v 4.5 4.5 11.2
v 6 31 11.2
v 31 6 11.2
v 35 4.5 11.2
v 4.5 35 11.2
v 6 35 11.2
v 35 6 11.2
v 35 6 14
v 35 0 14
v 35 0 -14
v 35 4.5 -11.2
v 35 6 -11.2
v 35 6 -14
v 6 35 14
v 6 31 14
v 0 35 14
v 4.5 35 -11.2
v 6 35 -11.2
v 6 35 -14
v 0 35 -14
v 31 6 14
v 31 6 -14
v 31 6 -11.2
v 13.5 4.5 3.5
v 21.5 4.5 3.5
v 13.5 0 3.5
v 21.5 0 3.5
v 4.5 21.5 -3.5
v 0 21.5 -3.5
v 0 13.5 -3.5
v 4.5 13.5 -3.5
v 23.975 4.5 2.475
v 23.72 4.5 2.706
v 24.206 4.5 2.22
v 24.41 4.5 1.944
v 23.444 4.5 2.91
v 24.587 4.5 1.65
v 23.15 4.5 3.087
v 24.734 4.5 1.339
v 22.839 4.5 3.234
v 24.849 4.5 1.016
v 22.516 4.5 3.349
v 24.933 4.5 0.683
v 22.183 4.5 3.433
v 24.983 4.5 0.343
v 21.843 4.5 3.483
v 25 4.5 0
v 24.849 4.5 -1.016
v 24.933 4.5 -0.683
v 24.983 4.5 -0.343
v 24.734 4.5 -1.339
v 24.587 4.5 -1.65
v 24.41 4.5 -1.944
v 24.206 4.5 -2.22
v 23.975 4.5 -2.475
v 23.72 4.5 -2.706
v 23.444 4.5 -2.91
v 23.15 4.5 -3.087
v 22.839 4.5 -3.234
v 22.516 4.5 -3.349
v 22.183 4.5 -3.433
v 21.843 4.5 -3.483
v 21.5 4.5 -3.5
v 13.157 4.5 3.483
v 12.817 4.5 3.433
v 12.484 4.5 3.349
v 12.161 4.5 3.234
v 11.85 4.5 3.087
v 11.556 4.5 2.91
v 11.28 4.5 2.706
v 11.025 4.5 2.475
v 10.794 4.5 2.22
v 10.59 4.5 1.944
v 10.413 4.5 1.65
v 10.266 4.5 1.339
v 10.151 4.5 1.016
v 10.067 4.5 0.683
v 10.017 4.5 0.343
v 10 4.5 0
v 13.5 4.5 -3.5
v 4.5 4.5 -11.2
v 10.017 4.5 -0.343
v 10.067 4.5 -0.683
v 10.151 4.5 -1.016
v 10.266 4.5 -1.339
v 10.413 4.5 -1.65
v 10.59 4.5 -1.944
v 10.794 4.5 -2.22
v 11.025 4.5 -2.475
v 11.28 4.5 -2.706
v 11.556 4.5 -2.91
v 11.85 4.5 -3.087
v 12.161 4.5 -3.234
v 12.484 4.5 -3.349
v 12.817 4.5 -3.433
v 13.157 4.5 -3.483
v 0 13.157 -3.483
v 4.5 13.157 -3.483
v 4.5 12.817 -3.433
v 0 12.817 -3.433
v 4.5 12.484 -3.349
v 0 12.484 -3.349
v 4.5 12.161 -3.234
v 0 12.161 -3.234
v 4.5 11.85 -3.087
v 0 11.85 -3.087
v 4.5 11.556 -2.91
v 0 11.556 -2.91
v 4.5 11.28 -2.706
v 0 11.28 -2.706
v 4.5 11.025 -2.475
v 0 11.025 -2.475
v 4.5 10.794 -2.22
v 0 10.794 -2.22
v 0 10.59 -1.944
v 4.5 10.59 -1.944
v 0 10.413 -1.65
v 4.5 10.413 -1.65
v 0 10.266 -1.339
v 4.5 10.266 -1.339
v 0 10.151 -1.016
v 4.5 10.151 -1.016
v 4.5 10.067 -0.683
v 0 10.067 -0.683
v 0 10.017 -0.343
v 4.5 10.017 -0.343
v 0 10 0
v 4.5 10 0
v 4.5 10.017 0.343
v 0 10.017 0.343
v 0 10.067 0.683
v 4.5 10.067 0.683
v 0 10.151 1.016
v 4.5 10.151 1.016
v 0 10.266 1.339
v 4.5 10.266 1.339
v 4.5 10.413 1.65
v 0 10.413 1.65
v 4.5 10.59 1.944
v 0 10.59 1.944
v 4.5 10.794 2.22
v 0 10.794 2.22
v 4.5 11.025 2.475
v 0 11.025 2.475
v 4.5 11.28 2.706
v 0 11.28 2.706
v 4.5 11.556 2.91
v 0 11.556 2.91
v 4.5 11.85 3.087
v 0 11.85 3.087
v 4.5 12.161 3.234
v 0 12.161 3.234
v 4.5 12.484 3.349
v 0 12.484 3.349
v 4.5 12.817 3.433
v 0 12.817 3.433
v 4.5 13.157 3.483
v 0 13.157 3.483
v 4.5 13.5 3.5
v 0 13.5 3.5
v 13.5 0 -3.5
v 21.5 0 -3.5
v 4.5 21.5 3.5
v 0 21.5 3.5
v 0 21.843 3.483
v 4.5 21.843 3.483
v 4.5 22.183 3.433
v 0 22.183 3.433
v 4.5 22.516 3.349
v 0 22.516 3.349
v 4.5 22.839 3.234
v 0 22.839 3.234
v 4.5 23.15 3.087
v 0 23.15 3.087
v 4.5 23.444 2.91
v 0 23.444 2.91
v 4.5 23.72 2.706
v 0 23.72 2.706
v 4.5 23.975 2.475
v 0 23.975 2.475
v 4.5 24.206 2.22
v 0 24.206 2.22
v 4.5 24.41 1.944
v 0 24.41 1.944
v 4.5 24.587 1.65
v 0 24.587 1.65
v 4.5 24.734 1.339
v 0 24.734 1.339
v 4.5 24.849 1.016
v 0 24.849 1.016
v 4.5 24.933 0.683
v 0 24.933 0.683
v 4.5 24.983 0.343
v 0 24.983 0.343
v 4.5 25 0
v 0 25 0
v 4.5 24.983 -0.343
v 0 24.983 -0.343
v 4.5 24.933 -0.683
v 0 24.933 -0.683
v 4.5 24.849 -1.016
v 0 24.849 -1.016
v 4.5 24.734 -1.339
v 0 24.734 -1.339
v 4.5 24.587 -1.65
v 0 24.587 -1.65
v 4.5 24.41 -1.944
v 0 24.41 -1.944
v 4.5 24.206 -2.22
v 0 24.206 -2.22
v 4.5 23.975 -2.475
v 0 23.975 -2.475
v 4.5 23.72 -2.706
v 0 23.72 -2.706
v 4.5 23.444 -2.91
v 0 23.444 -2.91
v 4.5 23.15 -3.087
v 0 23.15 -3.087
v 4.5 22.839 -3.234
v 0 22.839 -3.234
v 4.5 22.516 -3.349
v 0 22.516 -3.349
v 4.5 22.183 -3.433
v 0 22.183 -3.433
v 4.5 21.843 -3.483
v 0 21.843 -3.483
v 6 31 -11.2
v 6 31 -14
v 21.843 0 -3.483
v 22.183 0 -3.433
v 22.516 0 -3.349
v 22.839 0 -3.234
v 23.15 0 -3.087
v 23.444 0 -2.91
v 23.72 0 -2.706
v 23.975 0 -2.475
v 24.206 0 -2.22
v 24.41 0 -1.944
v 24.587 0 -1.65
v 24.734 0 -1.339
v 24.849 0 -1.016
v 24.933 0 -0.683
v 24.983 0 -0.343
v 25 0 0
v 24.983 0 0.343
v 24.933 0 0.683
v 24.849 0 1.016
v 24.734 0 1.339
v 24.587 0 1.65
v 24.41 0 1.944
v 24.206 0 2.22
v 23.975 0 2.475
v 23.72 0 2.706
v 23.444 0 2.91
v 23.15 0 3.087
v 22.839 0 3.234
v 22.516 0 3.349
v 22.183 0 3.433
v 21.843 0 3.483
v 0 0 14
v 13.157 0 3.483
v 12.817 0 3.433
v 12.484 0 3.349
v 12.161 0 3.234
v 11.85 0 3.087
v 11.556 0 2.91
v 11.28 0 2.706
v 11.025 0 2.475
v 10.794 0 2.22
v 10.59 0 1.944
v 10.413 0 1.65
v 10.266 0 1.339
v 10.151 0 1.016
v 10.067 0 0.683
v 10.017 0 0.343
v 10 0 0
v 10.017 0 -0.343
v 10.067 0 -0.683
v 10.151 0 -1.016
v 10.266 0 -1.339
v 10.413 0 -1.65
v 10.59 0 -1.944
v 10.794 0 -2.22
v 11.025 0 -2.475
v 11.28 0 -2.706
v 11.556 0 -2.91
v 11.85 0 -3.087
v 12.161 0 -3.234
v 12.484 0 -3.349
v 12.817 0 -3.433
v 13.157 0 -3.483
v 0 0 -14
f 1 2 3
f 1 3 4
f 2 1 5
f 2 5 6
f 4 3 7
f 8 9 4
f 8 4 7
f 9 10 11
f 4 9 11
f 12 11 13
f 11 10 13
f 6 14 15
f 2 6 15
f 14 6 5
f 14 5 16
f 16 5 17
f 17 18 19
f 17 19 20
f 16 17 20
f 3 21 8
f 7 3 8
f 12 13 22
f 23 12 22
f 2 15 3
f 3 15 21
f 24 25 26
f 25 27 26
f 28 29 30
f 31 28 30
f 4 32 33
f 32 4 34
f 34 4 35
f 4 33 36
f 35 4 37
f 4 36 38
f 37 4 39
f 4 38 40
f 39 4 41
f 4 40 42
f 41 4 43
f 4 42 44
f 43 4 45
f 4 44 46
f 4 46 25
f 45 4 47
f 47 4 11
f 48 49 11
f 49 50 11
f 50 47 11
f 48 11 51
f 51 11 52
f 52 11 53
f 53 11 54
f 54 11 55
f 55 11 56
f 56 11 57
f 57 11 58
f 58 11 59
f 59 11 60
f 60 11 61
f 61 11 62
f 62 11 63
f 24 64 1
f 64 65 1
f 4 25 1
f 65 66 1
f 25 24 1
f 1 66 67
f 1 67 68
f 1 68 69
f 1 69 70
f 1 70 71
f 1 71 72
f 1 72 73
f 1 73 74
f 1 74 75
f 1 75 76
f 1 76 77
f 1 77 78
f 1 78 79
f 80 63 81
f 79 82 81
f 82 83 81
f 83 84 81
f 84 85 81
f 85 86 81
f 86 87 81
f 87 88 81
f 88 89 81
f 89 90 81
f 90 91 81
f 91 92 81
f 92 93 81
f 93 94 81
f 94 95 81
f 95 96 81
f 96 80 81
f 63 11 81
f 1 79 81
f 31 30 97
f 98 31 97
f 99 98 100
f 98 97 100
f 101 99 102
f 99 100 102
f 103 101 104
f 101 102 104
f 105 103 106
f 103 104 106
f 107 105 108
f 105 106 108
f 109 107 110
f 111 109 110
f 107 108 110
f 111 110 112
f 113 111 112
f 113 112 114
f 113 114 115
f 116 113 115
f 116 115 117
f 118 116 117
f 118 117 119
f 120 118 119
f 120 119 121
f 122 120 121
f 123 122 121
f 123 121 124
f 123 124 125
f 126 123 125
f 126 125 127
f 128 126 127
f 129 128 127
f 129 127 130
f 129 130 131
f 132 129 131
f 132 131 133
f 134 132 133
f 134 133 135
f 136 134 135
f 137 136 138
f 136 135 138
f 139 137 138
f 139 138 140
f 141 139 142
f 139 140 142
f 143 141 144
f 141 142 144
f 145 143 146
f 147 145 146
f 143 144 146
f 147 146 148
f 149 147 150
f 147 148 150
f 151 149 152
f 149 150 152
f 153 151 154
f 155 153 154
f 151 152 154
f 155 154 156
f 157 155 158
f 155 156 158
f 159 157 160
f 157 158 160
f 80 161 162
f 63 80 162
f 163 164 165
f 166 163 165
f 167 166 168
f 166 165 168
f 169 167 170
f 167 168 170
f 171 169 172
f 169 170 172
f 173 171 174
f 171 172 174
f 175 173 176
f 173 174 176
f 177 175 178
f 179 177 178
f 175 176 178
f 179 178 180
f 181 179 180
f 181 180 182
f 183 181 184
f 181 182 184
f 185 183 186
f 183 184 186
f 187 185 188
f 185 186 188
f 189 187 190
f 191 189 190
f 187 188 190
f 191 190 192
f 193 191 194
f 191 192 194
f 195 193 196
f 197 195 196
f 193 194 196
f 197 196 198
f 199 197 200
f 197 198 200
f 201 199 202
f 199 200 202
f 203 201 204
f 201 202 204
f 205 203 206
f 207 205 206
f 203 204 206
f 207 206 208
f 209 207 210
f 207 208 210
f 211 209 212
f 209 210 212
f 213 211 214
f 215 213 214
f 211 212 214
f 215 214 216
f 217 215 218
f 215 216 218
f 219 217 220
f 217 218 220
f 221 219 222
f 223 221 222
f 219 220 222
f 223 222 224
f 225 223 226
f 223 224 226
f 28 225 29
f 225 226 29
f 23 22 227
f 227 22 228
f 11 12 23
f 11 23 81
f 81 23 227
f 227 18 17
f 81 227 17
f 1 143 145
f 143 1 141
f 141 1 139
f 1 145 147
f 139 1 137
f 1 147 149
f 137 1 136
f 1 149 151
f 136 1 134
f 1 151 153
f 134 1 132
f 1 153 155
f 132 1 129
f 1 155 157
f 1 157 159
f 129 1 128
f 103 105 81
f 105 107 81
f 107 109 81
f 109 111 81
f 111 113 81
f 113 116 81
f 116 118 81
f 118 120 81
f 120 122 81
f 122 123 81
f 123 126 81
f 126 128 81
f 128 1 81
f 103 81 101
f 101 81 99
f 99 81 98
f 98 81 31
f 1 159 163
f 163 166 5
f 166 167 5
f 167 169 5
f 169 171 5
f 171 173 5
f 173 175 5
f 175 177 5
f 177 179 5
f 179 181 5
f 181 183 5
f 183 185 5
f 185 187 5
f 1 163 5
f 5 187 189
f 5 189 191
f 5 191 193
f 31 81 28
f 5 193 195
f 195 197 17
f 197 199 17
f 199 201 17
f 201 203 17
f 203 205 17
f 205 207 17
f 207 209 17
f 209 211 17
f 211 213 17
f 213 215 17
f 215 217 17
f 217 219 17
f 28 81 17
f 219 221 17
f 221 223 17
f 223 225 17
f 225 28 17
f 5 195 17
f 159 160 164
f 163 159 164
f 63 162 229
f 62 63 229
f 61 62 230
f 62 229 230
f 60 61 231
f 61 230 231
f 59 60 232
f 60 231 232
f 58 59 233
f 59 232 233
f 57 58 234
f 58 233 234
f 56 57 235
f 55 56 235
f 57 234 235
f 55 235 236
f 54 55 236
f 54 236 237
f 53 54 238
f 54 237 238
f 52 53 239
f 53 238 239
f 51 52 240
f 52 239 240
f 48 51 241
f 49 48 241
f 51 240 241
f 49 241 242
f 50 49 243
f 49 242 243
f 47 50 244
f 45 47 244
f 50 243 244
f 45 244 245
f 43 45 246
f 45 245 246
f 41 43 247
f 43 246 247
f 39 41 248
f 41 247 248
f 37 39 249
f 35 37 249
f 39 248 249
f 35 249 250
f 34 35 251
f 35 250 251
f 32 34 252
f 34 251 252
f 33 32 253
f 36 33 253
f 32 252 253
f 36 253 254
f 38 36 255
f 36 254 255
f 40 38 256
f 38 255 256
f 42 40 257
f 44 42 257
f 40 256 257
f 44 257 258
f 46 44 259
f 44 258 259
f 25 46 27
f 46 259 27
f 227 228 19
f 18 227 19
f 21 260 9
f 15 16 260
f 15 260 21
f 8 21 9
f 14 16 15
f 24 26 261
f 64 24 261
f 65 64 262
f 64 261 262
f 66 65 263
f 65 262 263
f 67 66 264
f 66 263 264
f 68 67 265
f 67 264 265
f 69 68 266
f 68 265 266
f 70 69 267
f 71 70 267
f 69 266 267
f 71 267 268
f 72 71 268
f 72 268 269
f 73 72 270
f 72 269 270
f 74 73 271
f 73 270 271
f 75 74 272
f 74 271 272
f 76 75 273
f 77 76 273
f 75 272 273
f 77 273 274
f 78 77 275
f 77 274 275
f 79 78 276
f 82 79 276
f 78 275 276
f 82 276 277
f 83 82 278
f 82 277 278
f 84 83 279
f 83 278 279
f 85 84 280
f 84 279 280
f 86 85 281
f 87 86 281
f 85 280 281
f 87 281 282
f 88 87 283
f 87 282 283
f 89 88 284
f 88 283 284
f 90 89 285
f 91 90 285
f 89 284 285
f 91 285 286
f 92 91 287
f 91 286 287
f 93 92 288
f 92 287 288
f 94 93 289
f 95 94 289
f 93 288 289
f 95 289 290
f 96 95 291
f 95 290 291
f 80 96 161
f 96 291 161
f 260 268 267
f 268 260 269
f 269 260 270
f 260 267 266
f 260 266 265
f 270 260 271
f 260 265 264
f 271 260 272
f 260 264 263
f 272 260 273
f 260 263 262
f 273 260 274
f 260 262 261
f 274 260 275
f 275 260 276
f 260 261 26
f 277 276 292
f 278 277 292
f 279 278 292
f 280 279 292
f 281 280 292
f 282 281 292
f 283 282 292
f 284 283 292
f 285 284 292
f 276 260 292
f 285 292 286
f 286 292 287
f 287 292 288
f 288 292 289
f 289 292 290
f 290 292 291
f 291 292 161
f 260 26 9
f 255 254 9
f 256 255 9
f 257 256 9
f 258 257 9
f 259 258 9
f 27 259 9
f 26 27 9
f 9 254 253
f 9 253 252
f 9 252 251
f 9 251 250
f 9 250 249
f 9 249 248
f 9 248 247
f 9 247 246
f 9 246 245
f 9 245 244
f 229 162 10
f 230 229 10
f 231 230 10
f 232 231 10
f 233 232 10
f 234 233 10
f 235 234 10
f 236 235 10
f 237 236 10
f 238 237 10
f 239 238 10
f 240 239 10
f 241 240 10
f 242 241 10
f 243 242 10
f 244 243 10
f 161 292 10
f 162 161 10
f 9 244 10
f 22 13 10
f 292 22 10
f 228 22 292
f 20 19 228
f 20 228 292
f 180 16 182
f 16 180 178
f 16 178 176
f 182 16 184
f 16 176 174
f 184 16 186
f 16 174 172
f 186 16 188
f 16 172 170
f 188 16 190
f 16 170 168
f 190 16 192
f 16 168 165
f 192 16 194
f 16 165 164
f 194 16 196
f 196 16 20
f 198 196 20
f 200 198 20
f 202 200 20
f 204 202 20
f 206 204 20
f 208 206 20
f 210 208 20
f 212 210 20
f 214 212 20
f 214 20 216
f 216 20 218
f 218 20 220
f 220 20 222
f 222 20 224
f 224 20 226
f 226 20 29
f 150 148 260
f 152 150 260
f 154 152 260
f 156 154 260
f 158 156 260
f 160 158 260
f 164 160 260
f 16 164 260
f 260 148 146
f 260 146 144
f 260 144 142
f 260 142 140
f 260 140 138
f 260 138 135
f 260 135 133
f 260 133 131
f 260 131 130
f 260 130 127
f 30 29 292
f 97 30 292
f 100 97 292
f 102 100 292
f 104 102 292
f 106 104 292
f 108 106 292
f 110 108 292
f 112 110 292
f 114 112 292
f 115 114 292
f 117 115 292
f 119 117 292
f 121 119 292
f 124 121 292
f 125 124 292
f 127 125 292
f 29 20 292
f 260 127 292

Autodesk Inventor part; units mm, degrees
ref_plane "YZ Plane" through (0, 0, 0) normal (1, 0, 0) x (0, 1, 0)
ref_plane "XZ Plane" through (0, 0, 0) normal (0, 1, 0) x (-1, 0, 0)
ref_plane "XY Plane" through (0, 0, 0) normal (0, 0, 1) x (1, 0, 0)
sketch "Sketch1" plane through (0, 0, 0) normal (0, 0, 1) x (1, 0, 0)
  line L0 (0, 0) -> (35, 0)
  line L1 (35, 0) -> (35, 4.5)
  line L2 (35, 4.5) -> (4.5, 4.5)
  line L3 (4.5, 4.5) -> (4.5, 35)
  line L4 (4.5, 35) -> (0, 35)
  line L5 (0, 35) -> (0, 0)
  dimension "d0" = 35
  dimension "d1" = 35
  dimension "d2" = 4.5
  dimension "d3" = 4.5
extrude "Extrusion1" add sketch "Sketch1" along normal mid plane 28
sketch "Sketch2" plane through (0, 0, 14) normal (0, 0, 1) x (1, 0, 0)
  line L0 (0, 0) -> (35, 0) projected
  line L1 (35, 0) -> (35, 4.5) projected
  line L2 (35, 4.5) -> (4.5, 4.5) projected
  line L3 (4.5, 4.5) -> (4.5, 35) projected
  line L4 (4.5, 35) -> (0, 35) projected
  line L5 (0, 35) -> (0, 0) projected
  line L6 (4.5, 35) -> (6, 35)
  line L7 (6, 35) -> (6, 31)
  line L8 (6, 31) -> (31, 6)
  line L9 (31, 6) -> (35, 6)
  line L10 (35, 4.5) -> (4.5, 4.5) projected
  line L11 (35, 6) -> (35, 4.5)
  dimension "d6" = 45
  dimension "d7" = 1.5
  dimension "d8" = 1.5
  dimension "d9" = 4
extrude "Extrusion2" add sketch "Sketch2" against normal blind 2.8 contours L2 L3 L6 L7 L8 L9 L11
mirror "Mirror1" about plane through (0, 0, 0) normal (0, 0, 1) of "Extrusion2"
sketch "Sketch3" plane through (0, 0, 14) normal (-1, 0, 0) x (0, 0, 1)
  line L0 (0, 0) -> (-28, 0) projected
  line L1 (0, 35) -> (0, 0) projected
  line L2 (-28, 35) -> (0, 35) projected
  line L3 (-28, 0) -> (-28, 35) projected
  line L4 (-25.2, 35) -> (-2.8, 35) construction
  line L5 (-14, 35) -> (-14, 0) construction
  line L6 (-14, 21.5) -> (-14, 13.5)
  line L7 (-17.5, 21.5) -> (-17.5, 13.5)
  line L8 (-10.5, 13.5) -> (-10.5, 21.5)
  arc A0 (-10.5, 21.5) -> (-17.5, 21.5) centre (-14, 21.5) ccw
  arc A1 (-17.5, 13.5) -> (-10.5, 13.5) centre (-14, 13.5) ccw
  point P0 (-14, 17.5)
  point P1 (-14, 17.5)
  dimension "d12" = 8
  dimension "d13" = 3.5
extrude "Extrusion3" cut sketch "Sketch3" against normal through all contours A0 L8 A1 L7
sketch "Sketch4" plane through (0, 0, 14) normal (0, -1, 0) x (1, 0, 0)
  line L0 (35, -28) -> (35, 0) projected
  line L1 (0, 0) -> (35, 0) projected
  line L2 (0, 0) -> (0, -28) projected
  line L3 (35, -28) -> (0, -28) projected
  line L4 (0, -14) -> (35, -14) construction
  line L5 (13.5, -14) -> (21.5, -14) construction
  line L6 (13.5, -17.5) -> (21.5, -17.5)
  line L7 (21.5, -10.5) -> (13.5, -10.5)
  arc A0 (13.5, -10.5) -> (13.5, -17.5) centre (13.5, -14) ccw
  arc A1 (21.5, -17.5) -> (21.5, -10.5) centre (21.5, -14) ccw
  point P0 (17.5, -14)
  point P1 (17.5, -14)
  dimension "d16" = 8
  dimension "d17" = 3.5
extrude "Extrusion4" cut sketch "Sketch4" against normal through all contours A0 L7 A1 L6
properties part number "3030 Corner Bracket External"
